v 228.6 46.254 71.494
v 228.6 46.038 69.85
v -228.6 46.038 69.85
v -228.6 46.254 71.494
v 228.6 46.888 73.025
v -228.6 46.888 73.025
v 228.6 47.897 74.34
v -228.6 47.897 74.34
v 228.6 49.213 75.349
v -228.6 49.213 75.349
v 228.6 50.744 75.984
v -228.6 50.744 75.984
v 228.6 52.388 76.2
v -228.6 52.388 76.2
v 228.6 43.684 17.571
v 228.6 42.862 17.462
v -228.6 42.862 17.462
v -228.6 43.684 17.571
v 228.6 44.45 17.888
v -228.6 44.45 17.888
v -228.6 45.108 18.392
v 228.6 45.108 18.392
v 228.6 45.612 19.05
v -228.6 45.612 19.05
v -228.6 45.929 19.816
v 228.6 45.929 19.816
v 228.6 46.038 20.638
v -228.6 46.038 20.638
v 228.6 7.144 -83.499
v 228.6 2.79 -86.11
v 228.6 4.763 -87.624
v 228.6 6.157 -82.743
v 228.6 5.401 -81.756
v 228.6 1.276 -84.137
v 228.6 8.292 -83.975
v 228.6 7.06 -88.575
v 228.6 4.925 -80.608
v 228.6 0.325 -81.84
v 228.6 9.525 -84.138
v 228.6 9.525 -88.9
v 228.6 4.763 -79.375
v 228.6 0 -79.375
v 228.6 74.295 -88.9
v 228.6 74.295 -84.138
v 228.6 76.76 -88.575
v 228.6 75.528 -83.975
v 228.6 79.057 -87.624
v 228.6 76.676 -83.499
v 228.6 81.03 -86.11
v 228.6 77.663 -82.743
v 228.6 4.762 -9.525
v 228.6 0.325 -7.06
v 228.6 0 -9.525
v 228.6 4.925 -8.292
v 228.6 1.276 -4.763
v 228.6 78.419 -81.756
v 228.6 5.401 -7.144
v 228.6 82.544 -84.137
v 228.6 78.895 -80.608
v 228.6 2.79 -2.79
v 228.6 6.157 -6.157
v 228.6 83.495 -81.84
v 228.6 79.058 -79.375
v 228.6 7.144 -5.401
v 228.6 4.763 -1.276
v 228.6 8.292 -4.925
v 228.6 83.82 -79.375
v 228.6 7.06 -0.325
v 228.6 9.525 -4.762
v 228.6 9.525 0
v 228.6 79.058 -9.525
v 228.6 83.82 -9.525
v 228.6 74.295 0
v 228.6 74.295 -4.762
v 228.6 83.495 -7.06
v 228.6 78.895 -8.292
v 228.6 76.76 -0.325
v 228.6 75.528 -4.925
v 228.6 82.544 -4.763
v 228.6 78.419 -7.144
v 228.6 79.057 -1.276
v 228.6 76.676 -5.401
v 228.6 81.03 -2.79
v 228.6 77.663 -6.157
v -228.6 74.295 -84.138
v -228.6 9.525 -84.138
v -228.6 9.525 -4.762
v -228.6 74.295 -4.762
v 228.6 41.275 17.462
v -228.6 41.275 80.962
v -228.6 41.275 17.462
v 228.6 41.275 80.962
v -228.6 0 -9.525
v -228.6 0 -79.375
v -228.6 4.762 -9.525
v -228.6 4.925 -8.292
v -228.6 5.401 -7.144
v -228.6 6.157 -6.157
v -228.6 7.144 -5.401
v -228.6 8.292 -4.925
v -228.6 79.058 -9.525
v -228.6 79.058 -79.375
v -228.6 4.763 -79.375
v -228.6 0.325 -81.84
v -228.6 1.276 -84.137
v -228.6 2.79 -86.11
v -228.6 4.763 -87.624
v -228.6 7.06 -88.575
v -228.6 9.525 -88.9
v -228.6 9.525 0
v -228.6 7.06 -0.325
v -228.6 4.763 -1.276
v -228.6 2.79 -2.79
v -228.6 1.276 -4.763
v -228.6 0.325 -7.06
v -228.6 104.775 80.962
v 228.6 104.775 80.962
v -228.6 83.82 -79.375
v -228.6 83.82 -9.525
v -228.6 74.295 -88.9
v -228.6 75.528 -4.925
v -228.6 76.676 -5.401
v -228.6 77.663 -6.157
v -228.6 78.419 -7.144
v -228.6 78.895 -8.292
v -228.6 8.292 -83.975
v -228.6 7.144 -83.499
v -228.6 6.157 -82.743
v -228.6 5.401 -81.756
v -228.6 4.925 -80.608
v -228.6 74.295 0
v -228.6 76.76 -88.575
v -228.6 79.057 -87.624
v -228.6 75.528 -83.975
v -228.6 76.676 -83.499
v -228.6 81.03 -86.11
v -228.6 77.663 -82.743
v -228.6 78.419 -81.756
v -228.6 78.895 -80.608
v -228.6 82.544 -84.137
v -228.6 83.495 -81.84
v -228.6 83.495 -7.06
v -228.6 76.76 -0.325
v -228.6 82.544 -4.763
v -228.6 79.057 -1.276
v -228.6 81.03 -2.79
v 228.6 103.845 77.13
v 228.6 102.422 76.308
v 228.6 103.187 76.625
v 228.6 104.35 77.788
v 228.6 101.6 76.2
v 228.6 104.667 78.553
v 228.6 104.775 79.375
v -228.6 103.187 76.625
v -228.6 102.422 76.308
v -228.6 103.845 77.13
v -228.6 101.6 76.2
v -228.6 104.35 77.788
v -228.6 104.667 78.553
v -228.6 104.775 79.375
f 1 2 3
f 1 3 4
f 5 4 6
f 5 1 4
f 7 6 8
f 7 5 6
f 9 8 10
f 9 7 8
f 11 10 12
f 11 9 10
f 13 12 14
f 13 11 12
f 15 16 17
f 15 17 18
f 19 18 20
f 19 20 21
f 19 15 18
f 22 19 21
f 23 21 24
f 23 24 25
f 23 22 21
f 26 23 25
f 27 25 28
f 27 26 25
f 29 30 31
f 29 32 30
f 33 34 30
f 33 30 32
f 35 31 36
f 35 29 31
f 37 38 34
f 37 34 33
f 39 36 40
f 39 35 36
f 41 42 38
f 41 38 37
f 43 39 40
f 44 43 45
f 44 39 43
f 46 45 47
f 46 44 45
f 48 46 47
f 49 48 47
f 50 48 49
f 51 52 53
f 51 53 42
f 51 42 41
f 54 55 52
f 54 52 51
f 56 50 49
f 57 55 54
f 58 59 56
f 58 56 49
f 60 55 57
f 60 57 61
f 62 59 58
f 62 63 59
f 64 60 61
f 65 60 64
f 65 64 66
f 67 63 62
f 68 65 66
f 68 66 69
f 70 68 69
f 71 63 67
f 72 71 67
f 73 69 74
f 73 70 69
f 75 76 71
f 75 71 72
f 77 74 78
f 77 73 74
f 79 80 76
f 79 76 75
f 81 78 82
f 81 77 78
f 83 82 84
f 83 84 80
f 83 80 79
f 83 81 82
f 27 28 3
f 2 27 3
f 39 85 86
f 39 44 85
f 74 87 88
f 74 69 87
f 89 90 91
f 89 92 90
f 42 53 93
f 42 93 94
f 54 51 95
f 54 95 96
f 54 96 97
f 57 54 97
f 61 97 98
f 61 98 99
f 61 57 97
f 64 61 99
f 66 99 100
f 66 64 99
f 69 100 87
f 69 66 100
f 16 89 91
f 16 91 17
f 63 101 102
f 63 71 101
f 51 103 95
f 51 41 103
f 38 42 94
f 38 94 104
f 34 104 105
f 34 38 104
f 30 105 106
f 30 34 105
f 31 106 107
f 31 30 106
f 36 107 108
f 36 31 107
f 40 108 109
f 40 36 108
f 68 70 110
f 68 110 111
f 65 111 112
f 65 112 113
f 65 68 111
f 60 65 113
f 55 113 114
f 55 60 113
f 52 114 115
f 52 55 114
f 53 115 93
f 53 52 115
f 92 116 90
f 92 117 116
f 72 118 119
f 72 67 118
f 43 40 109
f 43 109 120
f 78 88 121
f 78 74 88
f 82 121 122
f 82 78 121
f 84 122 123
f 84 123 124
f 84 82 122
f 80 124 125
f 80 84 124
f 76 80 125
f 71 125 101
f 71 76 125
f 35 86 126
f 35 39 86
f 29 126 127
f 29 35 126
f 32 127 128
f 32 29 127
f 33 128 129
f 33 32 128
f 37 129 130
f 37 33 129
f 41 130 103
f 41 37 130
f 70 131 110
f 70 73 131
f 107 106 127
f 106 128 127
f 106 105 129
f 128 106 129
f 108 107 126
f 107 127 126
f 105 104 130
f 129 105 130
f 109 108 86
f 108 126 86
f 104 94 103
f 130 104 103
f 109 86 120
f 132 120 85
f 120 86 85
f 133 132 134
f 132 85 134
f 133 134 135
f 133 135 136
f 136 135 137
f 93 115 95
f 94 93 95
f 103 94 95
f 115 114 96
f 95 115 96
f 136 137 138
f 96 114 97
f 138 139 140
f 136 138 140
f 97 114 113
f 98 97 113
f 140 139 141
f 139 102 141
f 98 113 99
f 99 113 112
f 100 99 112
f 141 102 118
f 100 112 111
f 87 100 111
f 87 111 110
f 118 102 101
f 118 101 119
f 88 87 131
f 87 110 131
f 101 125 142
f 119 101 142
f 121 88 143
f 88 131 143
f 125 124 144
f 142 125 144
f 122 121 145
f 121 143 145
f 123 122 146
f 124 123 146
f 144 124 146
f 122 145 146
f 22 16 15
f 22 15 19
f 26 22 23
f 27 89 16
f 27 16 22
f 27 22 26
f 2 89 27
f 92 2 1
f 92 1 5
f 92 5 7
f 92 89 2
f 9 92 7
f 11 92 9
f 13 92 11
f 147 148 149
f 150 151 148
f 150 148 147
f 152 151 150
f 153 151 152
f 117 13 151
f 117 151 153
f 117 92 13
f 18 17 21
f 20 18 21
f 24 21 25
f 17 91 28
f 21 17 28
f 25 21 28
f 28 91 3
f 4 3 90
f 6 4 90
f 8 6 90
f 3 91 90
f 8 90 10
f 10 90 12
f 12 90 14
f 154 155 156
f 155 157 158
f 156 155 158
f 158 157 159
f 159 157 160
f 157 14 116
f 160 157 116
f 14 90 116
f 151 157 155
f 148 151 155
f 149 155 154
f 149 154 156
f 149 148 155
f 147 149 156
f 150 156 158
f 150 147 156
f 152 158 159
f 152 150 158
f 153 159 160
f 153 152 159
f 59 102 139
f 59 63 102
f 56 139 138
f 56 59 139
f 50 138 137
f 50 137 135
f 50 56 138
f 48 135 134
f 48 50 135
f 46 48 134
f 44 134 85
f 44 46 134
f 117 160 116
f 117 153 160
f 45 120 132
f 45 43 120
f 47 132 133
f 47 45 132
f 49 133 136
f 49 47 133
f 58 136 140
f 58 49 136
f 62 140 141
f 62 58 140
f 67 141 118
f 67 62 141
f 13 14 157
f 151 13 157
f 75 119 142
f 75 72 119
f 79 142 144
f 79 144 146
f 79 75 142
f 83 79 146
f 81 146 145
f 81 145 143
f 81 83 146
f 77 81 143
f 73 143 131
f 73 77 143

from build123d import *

# Parameters (mm, degrees)
F1_DEPTH = 228.6
F3_DEPTH = 228.6


with BuildPart() as f1:
    # F0 (on Right) → F1 (new body, symmetric)
    with BuildSketch(Plane.YZ):
        with BuildLine():
            Line((74.295, 0), (9.525, 0))
            ThreePointArc((9.525, 0), (2.789808, -2.789808), (0, -9.525))
            Line((0, -9.525), (0, -79.375))
            ThreePointArc((0, -79.375), (2.789808, -86.110192), (9.525, -88.9))
            Line((9.525, -88.9), (74.295, -88.9))
            ThreePointArc((74.295, -88.9), (81.030192, -86.110192), (83.82, -79.375))
            Line((83.82, -79.375), (83.82, -9.525))
            ThreePointArc((83.82, -9.525), (81.030192, -2.789808), (74.295, 0))
        make_face()
        with BuildLine():
            ThreePointArc((4.7625, -9.525), (6.157404, -6.157404), (9.525, -4.7625))
            Line((9.525, -4.7625), (74.295, -4.7625))
            ThreePointArc((74.295, -4.7625), (77.662596, -6.157404), (79.0575, -9.525))
            Line((79.0575, -9.525), (79.0575, -79.375))
            ThreePointArc((79.0575, -79.375), (77.662596, -82.742596), (74.295, -84.1375))
            Line((74.295, -84.1375), (9.525, -84.1375))
            ThreePointArc((9.525, -84.1375), (6.157404, -82.742596), (4.7625, -79.375))
            Line((4.7625, -79.375), (4.7625, -9.525))
        make_face(mode=Mode.SUBTRACT)
    extrude(amount=F1_DEPTH, both=True)


with BuildPart() as f3:
    # F2 (on Right) → F3 (new body, symmetric)
    with BuildSketch(Plane.YZ):
        with BuildLine():
            Line((41.275, 80.9625), (41.275, 17.4625))
            Line((41.275, 17.4625), (42.8625, 17.4625))
            ThreePointArc((42.8625, 17.4625), (45.107564, 18.392436), (46.0375, 20.6375))
            Line((46.0375, 20.6375), (46.0375, 69.85))
            ThreePointArc((46.0375, 69.85), (47.897372, 74.340128), (52.3875, 76.2))
            Line((52.3875, 76.2), (101.6, 76.2))
            ThreePointArc((101.6, 76.2), (103.845064, 77.129936), (104.775, 79.375))
            Line((104.775, 79.375), (104.775, 80.9625))
            Line((104.775, 80.9625), (41.275, 80.9625))
        make_face()
    extrude(amount=F3_DEPTH, both=True)


solid = Compound([f1.part, f3.part])
